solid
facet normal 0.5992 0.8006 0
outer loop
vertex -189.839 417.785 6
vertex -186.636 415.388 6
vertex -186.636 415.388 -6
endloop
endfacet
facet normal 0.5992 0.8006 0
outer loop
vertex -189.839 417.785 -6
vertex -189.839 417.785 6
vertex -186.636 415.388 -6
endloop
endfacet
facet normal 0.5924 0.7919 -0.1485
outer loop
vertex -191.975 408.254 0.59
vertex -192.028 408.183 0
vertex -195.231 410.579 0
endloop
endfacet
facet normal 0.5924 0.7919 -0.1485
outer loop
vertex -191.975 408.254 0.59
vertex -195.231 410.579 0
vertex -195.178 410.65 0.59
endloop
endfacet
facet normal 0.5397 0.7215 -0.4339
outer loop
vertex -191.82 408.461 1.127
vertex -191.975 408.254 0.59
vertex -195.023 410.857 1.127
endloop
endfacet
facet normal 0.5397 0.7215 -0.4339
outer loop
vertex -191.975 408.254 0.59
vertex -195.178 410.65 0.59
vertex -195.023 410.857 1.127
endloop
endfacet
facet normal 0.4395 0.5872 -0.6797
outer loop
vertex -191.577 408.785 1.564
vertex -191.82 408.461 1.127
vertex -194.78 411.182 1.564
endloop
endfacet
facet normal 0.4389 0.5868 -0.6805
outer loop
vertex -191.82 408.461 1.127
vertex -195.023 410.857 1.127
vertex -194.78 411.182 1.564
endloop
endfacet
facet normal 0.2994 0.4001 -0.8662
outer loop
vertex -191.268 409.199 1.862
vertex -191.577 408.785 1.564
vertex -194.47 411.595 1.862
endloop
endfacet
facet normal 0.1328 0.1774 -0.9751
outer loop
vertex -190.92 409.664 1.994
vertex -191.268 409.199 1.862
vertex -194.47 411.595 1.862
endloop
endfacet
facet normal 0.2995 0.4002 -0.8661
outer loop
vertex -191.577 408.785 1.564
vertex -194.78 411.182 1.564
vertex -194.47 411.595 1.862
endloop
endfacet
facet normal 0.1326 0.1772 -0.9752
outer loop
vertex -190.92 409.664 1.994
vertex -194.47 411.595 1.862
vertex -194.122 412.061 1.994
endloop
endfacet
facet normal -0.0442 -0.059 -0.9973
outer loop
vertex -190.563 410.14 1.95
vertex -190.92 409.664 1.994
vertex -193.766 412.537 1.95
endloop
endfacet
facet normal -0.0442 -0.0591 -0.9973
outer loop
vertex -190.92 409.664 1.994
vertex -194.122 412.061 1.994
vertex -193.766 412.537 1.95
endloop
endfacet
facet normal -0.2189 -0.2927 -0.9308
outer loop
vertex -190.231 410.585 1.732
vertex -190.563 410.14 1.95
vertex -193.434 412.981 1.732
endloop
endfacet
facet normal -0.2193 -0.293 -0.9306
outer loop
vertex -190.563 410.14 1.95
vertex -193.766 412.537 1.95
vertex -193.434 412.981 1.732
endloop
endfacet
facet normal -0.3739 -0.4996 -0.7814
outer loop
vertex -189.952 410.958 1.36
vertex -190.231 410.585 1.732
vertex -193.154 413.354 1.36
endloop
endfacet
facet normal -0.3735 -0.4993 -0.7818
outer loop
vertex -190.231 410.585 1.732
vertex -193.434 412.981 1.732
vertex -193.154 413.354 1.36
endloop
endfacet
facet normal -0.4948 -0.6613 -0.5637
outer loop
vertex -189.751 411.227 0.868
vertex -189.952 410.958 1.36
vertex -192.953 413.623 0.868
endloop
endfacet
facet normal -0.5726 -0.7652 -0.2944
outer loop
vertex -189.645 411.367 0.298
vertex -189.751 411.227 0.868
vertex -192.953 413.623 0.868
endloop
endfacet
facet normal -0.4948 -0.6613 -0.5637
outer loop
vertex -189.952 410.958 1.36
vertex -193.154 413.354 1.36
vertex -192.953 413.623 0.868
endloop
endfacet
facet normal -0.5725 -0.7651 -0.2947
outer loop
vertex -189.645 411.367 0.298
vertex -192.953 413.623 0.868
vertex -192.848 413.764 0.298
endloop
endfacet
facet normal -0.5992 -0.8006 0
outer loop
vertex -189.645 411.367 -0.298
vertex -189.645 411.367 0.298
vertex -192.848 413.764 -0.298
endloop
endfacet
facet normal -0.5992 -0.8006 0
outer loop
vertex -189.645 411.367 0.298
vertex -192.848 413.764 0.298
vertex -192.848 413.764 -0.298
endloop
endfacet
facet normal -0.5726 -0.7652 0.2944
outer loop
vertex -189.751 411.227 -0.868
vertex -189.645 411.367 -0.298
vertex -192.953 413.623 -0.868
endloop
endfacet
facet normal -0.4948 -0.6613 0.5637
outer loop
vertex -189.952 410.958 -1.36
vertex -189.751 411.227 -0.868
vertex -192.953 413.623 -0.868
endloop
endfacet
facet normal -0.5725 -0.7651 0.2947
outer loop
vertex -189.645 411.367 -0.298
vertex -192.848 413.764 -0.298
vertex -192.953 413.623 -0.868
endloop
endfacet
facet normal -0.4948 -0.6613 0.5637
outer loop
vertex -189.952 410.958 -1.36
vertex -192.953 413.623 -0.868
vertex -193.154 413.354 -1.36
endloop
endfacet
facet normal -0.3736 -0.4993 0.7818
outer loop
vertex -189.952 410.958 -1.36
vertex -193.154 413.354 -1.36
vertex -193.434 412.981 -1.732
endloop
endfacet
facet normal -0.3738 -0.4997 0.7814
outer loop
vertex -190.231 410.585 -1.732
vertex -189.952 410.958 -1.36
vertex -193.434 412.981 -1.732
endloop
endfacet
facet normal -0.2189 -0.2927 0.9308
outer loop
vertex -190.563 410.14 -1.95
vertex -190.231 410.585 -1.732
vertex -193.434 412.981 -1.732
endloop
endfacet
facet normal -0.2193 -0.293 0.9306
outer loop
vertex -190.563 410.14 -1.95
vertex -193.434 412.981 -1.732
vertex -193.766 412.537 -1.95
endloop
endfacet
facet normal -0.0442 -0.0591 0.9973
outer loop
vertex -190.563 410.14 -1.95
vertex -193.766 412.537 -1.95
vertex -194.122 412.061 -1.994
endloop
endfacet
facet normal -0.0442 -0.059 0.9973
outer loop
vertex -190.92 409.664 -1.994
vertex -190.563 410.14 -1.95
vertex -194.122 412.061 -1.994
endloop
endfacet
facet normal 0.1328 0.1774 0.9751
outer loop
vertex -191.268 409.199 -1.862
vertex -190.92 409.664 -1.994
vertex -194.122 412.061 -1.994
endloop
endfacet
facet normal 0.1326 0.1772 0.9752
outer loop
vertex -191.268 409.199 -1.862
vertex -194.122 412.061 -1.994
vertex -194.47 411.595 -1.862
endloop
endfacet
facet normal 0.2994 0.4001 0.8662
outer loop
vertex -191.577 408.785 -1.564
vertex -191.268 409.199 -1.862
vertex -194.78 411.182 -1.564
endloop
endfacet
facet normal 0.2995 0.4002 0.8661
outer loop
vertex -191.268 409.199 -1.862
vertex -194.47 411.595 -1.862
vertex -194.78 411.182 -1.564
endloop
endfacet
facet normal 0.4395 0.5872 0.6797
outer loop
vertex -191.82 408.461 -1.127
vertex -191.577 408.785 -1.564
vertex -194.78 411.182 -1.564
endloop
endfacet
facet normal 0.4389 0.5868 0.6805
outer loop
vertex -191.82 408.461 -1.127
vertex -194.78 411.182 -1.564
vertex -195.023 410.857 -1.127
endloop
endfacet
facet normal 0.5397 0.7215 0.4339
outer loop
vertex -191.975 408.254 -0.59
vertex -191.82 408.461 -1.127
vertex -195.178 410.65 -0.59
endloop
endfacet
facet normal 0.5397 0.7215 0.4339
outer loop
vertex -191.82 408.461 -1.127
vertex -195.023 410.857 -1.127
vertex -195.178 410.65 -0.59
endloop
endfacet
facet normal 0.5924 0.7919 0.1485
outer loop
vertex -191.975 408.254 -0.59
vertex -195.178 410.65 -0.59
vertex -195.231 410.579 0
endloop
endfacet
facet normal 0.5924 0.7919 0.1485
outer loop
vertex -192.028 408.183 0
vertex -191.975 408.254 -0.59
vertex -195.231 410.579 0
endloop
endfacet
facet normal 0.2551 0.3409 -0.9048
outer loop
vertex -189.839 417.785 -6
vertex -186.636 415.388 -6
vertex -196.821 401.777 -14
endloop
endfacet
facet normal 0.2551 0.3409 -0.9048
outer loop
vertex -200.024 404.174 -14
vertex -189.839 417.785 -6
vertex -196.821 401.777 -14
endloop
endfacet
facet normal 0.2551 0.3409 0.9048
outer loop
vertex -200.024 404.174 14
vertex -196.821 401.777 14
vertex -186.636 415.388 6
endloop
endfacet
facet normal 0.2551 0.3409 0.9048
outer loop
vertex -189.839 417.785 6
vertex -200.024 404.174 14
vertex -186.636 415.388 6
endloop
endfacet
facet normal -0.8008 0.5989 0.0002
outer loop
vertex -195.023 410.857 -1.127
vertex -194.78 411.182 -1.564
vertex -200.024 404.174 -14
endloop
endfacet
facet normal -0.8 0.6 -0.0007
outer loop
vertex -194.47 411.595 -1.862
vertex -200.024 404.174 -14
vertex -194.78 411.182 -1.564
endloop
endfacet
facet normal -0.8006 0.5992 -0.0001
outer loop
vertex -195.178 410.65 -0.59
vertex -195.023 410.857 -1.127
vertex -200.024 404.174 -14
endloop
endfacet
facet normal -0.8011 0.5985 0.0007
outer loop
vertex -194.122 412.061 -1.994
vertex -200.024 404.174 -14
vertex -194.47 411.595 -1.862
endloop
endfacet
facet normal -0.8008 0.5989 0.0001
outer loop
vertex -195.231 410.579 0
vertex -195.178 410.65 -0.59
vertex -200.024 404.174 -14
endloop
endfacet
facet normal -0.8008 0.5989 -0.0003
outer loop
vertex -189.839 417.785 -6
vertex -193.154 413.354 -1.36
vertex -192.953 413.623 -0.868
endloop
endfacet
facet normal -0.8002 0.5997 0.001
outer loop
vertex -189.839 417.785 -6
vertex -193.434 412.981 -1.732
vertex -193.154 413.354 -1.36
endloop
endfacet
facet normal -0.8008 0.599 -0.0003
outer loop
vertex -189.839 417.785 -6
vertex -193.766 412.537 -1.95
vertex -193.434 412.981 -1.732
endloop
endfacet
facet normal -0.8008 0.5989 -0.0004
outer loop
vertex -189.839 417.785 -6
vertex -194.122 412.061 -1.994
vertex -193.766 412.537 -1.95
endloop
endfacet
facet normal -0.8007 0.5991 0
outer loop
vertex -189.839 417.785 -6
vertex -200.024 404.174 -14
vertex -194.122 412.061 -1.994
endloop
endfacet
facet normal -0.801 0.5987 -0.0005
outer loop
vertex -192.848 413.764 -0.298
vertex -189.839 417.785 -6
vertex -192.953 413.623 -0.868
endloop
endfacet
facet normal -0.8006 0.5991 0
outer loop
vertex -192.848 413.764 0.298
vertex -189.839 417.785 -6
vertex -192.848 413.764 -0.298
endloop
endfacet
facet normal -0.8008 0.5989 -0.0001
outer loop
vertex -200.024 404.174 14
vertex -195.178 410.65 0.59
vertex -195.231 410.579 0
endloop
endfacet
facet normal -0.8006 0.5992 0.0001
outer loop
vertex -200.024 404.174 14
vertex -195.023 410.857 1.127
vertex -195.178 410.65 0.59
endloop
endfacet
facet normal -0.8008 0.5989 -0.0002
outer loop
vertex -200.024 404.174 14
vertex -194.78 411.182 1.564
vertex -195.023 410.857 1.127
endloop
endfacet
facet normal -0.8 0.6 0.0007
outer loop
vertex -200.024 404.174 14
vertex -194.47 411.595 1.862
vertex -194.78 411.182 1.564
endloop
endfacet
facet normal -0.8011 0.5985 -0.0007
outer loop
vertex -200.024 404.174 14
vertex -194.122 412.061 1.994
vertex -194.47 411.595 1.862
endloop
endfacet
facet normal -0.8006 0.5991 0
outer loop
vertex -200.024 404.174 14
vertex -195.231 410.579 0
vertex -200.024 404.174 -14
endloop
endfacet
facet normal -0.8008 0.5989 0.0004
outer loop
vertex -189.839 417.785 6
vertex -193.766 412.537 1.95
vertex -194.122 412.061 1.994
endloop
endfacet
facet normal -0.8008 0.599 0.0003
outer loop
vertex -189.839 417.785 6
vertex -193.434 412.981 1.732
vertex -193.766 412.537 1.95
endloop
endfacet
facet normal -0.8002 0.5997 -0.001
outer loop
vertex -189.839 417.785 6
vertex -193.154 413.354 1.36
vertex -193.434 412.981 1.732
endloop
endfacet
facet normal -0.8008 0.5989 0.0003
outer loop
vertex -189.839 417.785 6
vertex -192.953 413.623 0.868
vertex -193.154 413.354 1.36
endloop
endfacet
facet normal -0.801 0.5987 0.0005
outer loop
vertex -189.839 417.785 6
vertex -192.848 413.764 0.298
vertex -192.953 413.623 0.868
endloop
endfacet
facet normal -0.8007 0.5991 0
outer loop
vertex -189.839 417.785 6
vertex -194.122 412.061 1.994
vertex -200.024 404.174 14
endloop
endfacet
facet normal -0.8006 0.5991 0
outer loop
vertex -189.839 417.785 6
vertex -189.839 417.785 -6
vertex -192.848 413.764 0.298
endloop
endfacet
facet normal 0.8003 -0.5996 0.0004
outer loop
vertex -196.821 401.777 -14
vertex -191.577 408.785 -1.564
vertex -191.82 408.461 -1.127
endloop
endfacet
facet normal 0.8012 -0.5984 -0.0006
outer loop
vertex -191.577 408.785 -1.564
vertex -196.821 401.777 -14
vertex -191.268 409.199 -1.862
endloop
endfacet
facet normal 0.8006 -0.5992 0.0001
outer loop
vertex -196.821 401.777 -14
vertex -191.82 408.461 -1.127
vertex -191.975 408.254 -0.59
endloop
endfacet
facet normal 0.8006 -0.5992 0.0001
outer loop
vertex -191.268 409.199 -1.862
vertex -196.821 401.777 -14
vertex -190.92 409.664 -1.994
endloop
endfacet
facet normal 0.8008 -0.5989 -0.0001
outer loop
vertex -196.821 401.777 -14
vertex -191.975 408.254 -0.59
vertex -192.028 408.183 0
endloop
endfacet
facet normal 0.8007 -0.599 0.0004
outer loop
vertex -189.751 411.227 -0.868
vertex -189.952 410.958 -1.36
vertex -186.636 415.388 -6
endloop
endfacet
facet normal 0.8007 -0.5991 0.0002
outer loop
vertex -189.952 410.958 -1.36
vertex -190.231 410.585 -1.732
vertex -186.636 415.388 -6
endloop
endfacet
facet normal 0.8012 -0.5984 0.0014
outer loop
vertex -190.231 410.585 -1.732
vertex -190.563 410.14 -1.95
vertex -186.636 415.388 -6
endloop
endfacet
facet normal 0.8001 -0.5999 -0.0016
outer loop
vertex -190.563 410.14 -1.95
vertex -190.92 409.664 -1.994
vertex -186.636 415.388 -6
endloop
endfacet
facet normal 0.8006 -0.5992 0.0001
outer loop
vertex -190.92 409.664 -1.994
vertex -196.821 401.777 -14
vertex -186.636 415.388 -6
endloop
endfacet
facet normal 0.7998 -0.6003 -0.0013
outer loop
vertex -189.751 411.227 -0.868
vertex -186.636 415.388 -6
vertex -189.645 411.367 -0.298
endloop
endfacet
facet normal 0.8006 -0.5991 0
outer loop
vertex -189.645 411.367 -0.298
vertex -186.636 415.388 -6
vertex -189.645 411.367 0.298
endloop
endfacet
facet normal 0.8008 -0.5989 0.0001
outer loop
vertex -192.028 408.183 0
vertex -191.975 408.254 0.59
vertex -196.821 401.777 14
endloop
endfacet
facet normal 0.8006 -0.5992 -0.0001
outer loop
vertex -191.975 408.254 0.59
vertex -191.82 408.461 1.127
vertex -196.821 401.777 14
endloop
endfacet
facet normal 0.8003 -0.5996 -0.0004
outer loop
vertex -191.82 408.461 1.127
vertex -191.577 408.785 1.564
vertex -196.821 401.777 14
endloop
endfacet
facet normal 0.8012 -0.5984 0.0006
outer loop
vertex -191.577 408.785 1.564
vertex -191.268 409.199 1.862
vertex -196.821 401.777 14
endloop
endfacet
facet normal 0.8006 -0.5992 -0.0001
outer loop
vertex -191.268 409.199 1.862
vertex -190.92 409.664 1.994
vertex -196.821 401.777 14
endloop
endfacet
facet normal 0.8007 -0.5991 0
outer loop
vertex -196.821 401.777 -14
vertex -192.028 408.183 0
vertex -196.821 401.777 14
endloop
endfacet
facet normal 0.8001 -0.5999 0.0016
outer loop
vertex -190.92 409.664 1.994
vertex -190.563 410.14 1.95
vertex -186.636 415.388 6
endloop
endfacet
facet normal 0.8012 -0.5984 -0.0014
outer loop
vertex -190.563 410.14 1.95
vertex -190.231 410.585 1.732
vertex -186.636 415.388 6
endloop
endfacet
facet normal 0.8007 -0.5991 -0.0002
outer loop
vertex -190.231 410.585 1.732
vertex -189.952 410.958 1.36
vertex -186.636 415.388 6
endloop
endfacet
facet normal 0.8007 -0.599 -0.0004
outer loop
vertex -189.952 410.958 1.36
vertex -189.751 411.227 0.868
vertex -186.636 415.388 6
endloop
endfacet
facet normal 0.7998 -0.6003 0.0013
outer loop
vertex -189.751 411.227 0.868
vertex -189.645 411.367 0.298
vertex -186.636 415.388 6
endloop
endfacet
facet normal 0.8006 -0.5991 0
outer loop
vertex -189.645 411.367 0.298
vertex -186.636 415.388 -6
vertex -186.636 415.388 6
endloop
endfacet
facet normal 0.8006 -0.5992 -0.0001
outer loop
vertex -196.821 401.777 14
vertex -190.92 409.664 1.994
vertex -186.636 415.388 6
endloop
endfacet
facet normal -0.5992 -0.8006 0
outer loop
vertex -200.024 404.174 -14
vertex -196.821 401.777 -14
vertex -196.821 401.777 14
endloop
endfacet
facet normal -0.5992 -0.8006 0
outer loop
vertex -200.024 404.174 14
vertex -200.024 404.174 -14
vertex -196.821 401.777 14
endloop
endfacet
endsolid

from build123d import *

# Parameters (mm, degrees)
YUGO_DEPTH          = 4
OJO_CABLE_PROFILE_R = 2


with BuildPart() as part:
    # Sk_Yugo → Yugo (new body)
    with BuildSketch(Plane(origin=(-318.901689809, 238.632958282, 0), x_dir=(0, 0, 1), z_dir=(-0.800654275017383, 0.5991266409502992, 0))):
        Polygon((-14, 203.763792808), (14, 203.763792808), (6, 220.763792808), (-6, 220.763792808), align=None)
    extrude(amount=YUGO_DEPTH)

    # Ojo_cable: sweep along a curve in space
    with BuildLine() as ojo_cable_path:
        Line((-190.029452392, 409.184726197, 0), (-194.833378042, 412.779486043, 0))
    # Ojo_cable profile (on start of the path) → Ojo_cable (sweep, cut)
    with BuildSketch(Plane(origin=(-190.029452392, 409.184726197, 0), x_dir=(-0.5991266409502979, -0.8006542750173841, 0), z_dir=(-0.8006542750173841, 0.5991266409502979, 0))):
        Circle(OJO_CABLE_PROFILE_R)
    sweep(path=ojo_cable_path.line, mode=Mode.SUBTRACT)


solid = part.part
